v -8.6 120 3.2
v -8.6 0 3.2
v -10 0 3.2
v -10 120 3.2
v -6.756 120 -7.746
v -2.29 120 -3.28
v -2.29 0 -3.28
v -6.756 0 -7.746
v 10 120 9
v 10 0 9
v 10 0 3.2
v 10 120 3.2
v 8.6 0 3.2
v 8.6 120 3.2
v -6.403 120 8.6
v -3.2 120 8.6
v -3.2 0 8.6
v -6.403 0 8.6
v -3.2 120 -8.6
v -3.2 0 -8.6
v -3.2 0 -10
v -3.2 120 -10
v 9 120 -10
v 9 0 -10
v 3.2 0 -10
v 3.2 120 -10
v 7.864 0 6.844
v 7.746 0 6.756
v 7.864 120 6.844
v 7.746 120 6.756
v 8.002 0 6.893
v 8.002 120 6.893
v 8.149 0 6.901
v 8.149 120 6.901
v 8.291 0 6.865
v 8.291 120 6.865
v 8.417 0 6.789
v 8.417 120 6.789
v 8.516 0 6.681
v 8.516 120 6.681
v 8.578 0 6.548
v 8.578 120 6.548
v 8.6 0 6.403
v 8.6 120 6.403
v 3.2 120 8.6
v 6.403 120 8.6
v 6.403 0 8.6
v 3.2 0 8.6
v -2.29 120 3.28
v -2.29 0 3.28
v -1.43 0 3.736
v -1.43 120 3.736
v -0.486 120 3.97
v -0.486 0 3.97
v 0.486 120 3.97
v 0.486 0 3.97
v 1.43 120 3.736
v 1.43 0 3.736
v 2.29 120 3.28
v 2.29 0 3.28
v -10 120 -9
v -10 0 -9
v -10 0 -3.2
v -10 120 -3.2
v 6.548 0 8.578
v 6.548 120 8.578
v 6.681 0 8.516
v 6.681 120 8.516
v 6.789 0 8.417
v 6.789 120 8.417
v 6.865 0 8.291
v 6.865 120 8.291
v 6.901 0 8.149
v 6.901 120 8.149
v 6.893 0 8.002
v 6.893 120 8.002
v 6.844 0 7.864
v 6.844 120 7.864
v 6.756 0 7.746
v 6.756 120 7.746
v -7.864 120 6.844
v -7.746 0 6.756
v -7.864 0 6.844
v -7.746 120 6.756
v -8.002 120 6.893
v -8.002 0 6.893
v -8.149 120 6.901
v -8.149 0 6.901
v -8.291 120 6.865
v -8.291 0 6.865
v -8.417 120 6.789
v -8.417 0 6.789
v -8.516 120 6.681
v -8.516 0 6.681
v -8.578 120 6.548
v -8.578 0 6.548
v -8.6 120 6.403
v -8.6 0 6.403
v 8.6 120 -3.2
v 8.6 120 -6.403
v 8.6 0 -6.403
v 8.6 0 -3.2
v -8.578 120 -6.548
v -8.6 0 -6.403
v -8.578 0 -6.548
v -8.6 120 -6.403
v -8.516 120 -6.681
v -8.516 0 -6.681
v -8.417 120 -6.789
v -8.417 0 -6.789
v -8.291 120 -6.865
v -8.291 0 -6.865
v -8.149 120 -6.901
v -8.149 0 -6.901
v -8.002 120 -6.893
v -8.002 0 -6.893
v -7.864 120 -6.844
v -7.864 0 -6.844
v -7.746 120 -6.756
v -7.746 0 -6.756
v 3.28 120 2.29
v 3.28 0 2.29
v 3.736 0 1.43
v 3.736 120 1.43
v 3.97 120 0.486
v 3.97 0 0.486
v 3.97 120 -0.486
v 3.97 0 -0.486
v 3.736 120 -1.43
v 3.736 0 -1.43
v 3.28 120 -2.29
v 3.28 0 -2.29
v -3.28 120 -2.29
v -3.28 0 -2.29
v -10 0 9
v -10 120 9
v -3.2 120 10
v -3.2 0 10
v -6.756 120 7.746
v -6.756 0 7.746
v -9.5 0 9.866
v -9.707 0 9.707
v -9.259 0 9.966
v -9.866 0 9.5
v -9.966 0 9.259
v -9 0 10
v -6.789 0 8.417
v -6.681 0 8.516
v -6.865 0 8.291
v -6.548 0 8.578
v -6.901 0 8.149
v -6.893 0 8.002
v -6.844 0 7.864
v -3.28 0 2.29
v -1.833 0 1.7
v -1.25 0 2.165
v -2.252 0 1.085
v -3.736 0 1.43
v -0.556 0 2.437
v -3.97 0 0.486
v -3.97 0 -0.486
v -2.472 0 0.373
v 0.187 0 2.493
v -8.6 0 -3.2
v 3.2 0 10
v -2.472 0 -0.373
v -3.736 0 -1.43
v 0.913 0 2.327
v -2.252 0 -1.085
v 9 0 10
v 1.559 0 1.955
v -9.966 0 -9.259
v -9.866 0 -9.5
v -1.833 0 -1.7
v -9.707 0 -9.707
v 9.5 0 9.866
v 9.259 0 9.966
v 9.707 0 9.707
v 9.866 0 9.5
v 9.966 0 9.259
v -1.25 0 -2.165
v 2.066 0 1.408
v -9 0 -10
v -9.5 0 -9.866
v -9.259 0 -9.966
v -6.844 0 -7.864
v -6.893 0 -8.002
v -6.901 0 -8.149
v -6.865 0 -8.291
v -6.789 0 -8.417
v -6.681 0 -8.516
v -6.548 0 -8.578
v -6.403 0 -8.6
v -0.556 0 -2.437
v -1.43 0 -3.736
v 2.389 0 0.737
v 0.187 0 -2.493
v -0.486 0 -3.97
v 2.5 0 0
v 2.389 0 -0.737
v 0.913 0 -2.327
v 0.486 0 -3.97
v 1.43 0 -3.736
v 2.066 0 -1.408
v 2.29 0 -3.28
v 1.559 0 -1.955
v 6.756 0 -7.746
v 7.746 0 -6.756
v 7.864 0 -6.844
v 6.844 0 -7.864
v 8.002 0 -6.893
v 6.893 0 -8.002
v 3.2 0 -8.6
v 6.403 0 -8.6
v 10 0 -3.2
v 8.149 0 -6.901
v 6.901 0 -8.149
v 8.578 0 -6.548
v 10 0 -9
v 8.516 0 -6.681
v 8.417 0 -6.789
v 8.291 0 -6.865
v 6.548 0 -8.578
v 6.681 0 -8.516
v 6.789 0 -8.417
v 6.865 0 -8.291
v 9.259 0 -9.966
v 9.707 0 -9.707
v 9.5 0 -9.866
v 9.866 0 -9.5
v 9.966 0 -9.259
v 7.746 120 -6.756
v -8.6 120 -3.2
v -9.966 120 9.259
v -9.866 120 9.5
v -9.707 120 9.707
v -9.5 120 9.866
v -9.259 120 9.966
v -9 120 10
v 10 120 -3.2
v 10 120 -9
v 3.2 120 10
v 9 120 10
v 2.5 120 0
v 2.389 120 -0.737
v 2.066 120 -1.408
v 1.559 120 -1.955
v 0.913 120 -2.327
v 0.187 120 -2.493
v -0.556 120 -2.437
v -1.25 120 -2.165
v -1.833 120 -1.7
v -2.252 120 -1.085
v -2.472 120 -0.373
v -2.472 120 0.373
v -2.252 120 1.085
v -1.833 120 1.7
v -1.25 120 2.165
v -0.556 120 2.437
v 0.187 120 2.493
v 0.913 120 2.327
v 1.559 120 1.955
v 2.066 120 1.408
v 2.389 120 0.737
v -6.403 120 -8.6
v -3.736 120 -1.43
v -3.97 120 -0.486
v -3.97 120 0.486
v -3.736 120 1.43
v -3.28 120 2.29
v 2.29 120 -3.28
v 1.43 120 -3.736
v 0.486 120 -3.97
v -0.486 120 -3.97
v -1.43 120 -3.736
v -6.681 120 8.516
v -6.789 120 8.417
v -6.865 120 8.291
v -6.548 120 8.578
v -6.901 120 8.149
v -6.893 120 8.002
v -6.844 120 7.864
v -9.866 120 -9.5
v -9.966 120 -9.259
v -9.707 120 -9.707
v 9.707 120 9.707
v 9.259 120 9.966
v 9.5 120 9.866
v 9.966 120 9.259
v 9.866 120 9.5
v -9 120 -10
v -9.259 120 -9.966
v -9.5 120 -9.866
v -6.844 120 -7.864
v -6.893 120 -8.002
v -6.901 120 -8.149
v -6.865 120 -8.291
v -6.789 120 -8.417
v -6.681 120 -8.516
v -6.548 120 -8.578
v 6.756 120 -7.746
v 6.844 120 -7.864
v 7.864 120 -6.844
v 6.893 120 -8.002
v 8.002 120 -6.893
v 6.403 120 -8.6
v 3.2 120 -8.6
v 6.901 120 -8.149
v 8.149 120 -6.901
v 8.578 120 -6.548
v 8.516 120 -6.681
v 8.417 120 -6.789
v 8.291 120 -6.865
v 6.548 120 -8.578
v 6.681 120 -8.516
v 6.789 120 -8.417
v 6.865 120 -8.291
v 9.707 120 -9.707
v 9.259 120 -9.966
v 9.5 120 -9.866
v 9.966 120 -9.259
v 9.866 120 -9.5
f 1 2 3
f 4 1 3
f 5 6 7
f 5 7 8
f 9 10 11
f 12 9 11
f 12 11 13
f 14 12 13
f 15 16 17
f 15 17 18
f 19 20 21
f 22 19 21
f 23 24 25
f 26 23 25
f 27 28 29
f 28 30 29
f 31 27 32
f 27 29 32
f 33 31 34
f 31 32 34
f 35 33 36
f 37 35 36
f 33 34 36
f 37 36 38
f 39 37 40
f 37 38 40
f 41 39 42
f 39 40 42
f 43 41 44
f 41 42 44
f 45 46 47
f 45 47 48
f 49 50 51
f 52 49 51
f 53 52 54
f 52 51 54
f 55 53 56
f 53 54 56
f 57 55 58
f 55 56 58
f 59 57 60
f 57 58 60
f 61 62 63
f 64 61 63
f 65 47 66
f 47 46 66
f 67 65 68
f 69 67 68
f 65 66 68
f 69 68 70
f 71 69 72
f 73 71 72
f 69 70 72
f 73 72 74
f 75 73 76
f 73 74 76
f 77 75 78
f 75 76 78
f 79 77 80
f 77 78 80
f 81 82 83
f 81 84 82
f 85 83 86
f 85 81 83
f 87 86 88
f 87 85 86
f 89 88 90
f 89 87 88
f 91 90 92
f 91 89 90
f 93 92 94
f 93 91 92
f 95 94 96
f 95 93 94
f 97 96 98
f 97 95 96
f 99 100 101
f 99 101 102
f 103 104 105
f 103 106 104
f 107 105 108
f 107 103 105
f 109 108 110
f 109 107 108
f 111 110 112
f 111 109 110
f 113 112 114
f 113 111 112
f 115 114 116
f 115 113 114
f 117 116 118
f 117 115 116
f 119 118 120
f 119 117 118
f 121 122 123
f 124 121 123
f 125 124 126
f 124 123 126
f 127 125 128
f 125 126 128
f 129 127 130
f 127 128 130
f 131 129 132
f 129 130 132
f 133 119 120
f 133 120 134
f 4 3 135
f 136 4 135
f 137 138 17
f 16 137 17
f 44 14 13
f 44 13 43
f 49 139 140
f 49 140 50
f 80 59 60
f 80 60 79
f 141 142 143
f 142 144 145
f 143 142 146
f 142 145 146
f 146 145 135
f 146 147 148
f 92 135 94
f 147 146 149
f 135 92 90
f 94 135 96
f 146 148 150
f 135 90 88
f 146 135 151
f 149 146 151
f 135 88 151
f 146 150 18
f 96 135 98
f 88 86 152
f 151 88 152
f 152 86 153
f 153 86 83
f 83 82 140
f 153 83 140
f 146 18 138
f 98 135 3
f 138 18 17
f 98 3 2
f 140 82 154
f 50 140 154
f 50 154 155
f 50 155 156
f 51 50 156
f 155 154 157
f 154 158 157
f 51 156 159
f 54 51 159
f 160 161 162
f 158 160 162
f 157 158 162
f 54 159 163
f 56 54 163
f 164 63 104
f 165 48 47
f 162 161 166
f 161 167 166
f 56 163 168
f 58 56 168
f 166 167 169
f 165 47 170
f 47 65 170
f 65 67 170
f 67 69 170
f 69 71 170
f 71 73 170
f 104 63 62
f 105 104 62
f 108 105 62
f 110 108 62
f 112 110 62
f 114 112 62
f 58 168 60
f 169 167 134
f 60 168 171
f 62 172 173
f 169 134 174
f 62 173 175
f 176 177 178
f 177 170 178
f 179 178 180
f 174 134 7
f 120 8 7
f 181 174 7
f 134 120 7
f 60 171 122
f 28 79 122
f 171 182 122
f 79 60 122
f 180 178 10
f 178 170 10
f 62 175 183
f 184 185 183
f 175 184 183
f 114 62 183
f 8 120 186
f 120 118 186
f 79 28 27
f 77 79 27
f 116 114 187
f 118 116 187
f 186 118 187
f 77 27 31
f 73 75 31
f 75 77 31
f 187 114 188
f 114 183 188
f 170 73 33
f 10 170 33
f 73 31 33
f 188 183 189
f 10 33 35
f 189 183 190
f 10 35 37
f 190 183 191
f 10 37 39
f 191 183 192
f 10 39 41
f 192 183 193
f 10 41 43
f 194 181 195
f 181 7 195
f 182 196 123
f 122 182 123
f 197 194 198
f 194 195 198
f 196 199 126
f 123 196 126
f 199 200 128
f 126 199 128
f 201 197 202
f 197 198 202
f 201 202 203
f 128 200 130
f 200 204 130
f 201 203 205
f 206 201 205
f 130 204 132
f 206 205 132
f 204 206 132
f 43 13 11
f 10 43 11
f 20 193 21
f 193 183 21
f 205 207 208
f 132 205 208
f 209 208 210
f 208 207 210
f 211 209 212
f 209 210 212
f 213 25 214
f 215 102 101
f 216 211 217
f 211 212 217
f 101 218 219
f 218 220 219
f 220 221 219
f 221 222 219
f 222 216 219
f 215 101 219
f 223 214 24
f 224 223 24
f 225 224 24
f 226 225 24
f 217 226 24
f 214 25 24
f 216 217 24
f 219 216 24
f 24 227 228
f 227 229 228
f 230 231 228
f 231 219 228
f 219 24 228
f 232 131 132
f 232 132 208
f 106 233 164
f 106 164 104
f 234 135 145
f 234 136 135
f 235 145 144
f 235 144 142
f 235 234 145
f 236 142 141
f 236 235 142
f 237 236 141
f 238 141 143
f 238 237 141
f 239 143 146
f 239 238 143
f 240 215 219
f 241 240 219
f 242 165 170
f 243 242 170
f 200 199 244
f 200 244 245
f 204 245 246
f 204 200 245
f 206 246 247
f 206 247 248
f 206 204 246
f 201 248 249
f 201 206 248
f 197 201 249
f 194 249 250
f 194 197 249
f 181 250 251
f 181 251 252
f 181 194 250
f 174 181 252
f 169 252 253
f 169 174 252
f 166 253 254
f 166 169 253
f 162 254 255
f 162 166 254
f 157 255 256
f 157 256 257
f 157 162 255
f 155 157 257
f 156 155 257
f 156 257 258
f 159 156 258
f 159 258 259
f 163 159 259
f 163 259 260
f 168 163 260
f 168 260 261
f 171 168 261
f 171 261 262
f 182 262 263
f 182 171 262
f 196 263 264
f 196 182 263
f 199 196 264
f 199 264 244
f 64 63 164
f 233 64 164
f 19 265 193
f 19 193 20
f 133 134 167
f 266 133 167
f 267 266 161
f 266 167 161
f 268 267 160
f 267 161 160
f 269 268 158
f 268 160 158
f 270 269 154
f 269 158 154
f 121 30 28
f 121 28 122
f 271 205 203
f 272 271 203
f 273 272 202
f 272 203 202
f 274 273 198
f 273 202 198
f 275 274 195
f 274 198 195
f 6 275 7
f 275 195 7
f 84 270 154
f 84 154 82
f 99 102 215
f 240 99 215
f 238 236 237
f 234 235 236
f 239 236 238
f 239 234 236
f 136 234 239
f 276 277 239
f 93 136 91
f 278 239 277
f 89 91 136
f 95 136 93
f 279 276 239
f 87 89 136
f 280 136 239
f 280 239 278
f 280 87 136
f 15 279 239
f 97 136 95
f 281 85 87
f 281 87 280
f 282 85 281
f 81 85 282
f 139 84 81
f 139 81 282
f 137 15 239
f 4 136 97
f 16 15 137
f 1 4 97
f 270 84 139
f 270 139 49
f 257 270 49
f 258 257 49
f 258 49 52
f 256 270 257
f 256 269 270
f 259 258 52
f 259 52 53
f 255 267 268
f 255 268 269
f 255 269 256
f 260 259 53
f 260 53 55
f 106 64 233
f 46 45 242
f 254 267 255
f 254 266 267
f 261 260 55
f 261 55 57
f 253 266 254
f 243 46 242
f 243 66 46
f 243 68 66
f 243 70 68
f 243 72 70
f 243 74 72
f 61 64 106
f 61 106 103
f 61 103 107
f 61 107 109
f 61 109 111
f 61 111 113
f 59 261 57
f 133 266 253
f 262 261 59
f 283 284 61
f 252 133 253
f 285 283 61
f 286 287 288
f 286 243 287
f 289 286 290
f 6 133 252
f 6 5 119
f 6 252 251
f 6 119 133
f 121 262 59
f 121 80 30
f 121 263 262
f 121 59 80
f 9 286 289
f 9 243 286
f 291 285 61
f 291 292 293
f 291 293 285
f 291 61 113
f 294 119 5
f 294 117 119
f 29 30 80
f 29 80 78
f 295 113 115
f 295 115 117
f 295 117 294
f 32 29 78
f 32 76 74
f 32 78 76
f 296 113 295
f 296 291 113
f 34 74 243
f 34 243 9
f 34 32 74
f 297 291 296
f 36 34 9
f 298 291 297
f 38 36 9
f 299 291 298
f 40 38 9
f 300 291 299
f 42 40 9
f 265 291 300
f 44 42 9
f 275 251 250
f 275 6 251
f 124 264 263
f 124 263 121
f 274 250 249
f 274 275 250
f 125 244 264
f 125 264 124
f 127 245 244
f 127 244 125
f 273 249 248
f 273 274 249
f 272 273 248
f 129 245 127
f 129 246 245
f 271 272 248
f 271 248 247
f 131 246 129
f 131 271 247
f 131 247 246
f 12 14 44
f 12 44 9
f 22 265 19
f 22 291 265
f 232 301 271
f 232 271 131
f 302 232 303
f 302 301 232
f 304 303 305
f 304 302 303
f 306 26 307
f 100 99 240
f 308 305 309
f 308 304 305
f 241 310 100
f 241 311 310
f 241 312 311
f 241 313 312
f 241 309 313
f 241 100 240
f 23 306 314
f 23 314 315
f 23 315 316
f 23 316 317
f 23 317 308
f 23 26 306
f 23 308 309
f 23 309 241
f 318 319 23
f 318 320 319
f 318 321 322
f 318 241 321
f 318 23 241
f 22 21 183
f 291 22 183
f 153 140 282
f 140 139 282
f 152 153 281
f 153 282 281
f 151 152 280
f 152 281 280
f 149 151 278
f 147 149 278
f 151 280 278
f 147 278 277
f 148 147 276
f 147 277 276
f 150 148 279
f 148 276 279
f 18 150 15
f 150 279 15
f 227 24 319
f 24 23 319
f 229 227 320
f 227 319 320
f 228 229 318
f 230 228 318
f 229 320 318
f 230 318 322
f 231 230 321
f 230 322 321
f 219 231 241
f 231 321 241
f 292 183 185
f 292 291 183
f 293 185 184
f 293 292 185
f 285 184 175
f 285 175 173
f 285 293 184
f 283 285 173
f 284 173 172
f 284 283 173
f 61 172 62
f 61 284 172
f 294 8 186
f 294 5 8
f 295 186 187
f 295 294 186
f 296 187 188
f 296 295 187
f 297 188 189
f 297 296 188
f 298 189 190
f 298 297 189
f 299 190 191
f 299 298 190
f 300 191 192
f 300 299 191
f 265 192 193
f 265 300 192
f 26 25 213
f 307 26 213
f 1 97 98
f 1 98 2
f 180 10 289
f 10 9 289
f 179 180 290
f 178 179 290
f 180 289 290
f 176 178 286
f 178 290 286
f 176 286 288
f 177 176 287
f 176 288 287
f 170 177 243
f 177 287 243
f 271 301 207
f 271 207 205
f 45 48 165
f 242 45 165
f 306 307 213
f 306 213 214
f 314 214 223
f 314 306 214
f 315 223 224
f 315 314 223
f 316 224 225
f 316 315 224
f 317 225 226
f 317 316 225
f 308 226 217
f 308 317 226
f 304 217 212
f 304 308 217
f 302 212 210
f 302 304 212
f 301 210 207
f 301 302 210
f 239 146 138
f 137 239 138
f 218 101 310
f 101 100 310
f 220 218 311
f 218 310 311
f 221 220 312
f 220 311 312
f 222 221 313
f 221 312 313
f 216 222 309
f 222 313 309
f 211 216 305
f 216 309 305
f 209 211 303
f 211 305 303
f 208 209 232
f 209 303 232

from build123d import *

# Parameters (mm, degrees)
SKETCH1_R           = 2.5
BOSS_EXTRUDE1_DEPTH = 120
FILLET1_R           = 0.5
FILLET2_R           = 1


with BuildPart() as part:
    # Sketch1 → Boss-Extrude1 (new body)
    with BuildSketch(Plane(origin=(0, 0, 0), x_dir=(1, 0, 0), z_dir=(0, 1, 0))):
        with BuildLine():
            Line((3.2, 10), (3.2, 8.6))
            Line((3.2, 8.6), (7.610050506, 8.6))
            Line((7.610050506, 8.6), (2.289805316, 3.27975481))
            ThreePointArc((2.289805316, 3.27975481), (0, 4), (-2.289805316, 3.27975481))
            Line((-2.289805316, 3.27975481), (-7.610050506, 8.6))
            Line((-7.610050506, 8.6), (-3.2, 8.6))
            Line((-3.2, 8.6), (-3.2, 10))
            Line((-3.2, 10), (-10, 10))
            Line((-10, 10), (-10, 3.2))
            Line((-10, 3.2), (-8.6, 3.2))
            Line((-8.6, 3.2), (-8.6, 7.610050506))
            Line((-8.6, 7.610050506), (-3.27975481, 2.289805316))
            ThreePointArc((-3.27975481, 2.289805316), (-4, 0), (-3.27975481, -2.289805316))
            Line((-3.27975481, -2.289805316), (-8.6, -7.610050506))
            Line((-8.6, -7.610050506), (-8.6, -3.2))
            Line((-8.6, -3.2), (-10, -3.2))
            Line((-10, -3.2), (-10, -10))
            Line((-10, -10), (-3.2, -10))
            Line((-3.2, -10), (-3.2, -8.6))
            Line((-3.2, -8.6), (-7.610050506, -8.6))
            Line((-7.610050506, -8.6), (-2.289805316, -3.27975481))
            ThreePointArc((-2.289805316, -3.27975481), (0, -4), (2.289805316, -3.27975481))
            Line((2.289805316, -3.27975481), (7.610050506, -8.6))
            Line((7.610050506, -8.6), (3.2, -8.6))
            Line((3.2, -8.6), (3.2, -10))
            Line((3.2, -10), (10, -10))
            Line((10, -10), (10, -3.2))
            Line((10, -3.2), (8.6, -3.2))
            Line((8.6, -3.2), (8.6, -7.610050506))
            Line((8.6, -7.610050506), (3.27975481, -2.289805316))
            ThreePointArc((3.27975481, -2.289805316), (4, 0), (3.27975481, 2.289805316))
            Line((3.27975481, 2.289805316), (8.6, 7.610050506))
            Line((8.6, 7.610050506), (8.6, 3.2))
            Line((8.6, 3.2), (10, 3.2))
            Line((10, 3.2), (10, 10))
            Line((10, 10), (3.2, 10))
        make_face()
        Circle(SKETCH1_R, mode=Mode.SUBTRACT)
    extrude(amount=BOSS_EXTRUDE1_DEPTH)

    # Fillet1
    fillet1_edges = [part.edges().sort_by_distance(p)[0] for p in [
        (8.6, 60, -7.610050506),
        (8.6, 60, 7.610050506),
        (7.610050506, 60, 8.6),
        (-7.610050506, 60, 8.6),
        (-8.6, 60, 7.610050506),
        (-8.6, 60, -7.610050506),
        (-7.610050506, 60, -8.6),
        (7.610050506, 60, -8.6),
    ]]
    fillet(fillet1_edges, radius=FILLET1_R)

    # Fillet2
    fillet2_edges = [part.edges().sort_by_distance(p)[0] for p in [
        (10, 60, 10),
        (-10, 60, 10),
        (-10, 60, -10),
        (10, 60, -10),
    ]]
    fillet(fillet2_edges, radius=FILLET2_R)


solid = part.part
